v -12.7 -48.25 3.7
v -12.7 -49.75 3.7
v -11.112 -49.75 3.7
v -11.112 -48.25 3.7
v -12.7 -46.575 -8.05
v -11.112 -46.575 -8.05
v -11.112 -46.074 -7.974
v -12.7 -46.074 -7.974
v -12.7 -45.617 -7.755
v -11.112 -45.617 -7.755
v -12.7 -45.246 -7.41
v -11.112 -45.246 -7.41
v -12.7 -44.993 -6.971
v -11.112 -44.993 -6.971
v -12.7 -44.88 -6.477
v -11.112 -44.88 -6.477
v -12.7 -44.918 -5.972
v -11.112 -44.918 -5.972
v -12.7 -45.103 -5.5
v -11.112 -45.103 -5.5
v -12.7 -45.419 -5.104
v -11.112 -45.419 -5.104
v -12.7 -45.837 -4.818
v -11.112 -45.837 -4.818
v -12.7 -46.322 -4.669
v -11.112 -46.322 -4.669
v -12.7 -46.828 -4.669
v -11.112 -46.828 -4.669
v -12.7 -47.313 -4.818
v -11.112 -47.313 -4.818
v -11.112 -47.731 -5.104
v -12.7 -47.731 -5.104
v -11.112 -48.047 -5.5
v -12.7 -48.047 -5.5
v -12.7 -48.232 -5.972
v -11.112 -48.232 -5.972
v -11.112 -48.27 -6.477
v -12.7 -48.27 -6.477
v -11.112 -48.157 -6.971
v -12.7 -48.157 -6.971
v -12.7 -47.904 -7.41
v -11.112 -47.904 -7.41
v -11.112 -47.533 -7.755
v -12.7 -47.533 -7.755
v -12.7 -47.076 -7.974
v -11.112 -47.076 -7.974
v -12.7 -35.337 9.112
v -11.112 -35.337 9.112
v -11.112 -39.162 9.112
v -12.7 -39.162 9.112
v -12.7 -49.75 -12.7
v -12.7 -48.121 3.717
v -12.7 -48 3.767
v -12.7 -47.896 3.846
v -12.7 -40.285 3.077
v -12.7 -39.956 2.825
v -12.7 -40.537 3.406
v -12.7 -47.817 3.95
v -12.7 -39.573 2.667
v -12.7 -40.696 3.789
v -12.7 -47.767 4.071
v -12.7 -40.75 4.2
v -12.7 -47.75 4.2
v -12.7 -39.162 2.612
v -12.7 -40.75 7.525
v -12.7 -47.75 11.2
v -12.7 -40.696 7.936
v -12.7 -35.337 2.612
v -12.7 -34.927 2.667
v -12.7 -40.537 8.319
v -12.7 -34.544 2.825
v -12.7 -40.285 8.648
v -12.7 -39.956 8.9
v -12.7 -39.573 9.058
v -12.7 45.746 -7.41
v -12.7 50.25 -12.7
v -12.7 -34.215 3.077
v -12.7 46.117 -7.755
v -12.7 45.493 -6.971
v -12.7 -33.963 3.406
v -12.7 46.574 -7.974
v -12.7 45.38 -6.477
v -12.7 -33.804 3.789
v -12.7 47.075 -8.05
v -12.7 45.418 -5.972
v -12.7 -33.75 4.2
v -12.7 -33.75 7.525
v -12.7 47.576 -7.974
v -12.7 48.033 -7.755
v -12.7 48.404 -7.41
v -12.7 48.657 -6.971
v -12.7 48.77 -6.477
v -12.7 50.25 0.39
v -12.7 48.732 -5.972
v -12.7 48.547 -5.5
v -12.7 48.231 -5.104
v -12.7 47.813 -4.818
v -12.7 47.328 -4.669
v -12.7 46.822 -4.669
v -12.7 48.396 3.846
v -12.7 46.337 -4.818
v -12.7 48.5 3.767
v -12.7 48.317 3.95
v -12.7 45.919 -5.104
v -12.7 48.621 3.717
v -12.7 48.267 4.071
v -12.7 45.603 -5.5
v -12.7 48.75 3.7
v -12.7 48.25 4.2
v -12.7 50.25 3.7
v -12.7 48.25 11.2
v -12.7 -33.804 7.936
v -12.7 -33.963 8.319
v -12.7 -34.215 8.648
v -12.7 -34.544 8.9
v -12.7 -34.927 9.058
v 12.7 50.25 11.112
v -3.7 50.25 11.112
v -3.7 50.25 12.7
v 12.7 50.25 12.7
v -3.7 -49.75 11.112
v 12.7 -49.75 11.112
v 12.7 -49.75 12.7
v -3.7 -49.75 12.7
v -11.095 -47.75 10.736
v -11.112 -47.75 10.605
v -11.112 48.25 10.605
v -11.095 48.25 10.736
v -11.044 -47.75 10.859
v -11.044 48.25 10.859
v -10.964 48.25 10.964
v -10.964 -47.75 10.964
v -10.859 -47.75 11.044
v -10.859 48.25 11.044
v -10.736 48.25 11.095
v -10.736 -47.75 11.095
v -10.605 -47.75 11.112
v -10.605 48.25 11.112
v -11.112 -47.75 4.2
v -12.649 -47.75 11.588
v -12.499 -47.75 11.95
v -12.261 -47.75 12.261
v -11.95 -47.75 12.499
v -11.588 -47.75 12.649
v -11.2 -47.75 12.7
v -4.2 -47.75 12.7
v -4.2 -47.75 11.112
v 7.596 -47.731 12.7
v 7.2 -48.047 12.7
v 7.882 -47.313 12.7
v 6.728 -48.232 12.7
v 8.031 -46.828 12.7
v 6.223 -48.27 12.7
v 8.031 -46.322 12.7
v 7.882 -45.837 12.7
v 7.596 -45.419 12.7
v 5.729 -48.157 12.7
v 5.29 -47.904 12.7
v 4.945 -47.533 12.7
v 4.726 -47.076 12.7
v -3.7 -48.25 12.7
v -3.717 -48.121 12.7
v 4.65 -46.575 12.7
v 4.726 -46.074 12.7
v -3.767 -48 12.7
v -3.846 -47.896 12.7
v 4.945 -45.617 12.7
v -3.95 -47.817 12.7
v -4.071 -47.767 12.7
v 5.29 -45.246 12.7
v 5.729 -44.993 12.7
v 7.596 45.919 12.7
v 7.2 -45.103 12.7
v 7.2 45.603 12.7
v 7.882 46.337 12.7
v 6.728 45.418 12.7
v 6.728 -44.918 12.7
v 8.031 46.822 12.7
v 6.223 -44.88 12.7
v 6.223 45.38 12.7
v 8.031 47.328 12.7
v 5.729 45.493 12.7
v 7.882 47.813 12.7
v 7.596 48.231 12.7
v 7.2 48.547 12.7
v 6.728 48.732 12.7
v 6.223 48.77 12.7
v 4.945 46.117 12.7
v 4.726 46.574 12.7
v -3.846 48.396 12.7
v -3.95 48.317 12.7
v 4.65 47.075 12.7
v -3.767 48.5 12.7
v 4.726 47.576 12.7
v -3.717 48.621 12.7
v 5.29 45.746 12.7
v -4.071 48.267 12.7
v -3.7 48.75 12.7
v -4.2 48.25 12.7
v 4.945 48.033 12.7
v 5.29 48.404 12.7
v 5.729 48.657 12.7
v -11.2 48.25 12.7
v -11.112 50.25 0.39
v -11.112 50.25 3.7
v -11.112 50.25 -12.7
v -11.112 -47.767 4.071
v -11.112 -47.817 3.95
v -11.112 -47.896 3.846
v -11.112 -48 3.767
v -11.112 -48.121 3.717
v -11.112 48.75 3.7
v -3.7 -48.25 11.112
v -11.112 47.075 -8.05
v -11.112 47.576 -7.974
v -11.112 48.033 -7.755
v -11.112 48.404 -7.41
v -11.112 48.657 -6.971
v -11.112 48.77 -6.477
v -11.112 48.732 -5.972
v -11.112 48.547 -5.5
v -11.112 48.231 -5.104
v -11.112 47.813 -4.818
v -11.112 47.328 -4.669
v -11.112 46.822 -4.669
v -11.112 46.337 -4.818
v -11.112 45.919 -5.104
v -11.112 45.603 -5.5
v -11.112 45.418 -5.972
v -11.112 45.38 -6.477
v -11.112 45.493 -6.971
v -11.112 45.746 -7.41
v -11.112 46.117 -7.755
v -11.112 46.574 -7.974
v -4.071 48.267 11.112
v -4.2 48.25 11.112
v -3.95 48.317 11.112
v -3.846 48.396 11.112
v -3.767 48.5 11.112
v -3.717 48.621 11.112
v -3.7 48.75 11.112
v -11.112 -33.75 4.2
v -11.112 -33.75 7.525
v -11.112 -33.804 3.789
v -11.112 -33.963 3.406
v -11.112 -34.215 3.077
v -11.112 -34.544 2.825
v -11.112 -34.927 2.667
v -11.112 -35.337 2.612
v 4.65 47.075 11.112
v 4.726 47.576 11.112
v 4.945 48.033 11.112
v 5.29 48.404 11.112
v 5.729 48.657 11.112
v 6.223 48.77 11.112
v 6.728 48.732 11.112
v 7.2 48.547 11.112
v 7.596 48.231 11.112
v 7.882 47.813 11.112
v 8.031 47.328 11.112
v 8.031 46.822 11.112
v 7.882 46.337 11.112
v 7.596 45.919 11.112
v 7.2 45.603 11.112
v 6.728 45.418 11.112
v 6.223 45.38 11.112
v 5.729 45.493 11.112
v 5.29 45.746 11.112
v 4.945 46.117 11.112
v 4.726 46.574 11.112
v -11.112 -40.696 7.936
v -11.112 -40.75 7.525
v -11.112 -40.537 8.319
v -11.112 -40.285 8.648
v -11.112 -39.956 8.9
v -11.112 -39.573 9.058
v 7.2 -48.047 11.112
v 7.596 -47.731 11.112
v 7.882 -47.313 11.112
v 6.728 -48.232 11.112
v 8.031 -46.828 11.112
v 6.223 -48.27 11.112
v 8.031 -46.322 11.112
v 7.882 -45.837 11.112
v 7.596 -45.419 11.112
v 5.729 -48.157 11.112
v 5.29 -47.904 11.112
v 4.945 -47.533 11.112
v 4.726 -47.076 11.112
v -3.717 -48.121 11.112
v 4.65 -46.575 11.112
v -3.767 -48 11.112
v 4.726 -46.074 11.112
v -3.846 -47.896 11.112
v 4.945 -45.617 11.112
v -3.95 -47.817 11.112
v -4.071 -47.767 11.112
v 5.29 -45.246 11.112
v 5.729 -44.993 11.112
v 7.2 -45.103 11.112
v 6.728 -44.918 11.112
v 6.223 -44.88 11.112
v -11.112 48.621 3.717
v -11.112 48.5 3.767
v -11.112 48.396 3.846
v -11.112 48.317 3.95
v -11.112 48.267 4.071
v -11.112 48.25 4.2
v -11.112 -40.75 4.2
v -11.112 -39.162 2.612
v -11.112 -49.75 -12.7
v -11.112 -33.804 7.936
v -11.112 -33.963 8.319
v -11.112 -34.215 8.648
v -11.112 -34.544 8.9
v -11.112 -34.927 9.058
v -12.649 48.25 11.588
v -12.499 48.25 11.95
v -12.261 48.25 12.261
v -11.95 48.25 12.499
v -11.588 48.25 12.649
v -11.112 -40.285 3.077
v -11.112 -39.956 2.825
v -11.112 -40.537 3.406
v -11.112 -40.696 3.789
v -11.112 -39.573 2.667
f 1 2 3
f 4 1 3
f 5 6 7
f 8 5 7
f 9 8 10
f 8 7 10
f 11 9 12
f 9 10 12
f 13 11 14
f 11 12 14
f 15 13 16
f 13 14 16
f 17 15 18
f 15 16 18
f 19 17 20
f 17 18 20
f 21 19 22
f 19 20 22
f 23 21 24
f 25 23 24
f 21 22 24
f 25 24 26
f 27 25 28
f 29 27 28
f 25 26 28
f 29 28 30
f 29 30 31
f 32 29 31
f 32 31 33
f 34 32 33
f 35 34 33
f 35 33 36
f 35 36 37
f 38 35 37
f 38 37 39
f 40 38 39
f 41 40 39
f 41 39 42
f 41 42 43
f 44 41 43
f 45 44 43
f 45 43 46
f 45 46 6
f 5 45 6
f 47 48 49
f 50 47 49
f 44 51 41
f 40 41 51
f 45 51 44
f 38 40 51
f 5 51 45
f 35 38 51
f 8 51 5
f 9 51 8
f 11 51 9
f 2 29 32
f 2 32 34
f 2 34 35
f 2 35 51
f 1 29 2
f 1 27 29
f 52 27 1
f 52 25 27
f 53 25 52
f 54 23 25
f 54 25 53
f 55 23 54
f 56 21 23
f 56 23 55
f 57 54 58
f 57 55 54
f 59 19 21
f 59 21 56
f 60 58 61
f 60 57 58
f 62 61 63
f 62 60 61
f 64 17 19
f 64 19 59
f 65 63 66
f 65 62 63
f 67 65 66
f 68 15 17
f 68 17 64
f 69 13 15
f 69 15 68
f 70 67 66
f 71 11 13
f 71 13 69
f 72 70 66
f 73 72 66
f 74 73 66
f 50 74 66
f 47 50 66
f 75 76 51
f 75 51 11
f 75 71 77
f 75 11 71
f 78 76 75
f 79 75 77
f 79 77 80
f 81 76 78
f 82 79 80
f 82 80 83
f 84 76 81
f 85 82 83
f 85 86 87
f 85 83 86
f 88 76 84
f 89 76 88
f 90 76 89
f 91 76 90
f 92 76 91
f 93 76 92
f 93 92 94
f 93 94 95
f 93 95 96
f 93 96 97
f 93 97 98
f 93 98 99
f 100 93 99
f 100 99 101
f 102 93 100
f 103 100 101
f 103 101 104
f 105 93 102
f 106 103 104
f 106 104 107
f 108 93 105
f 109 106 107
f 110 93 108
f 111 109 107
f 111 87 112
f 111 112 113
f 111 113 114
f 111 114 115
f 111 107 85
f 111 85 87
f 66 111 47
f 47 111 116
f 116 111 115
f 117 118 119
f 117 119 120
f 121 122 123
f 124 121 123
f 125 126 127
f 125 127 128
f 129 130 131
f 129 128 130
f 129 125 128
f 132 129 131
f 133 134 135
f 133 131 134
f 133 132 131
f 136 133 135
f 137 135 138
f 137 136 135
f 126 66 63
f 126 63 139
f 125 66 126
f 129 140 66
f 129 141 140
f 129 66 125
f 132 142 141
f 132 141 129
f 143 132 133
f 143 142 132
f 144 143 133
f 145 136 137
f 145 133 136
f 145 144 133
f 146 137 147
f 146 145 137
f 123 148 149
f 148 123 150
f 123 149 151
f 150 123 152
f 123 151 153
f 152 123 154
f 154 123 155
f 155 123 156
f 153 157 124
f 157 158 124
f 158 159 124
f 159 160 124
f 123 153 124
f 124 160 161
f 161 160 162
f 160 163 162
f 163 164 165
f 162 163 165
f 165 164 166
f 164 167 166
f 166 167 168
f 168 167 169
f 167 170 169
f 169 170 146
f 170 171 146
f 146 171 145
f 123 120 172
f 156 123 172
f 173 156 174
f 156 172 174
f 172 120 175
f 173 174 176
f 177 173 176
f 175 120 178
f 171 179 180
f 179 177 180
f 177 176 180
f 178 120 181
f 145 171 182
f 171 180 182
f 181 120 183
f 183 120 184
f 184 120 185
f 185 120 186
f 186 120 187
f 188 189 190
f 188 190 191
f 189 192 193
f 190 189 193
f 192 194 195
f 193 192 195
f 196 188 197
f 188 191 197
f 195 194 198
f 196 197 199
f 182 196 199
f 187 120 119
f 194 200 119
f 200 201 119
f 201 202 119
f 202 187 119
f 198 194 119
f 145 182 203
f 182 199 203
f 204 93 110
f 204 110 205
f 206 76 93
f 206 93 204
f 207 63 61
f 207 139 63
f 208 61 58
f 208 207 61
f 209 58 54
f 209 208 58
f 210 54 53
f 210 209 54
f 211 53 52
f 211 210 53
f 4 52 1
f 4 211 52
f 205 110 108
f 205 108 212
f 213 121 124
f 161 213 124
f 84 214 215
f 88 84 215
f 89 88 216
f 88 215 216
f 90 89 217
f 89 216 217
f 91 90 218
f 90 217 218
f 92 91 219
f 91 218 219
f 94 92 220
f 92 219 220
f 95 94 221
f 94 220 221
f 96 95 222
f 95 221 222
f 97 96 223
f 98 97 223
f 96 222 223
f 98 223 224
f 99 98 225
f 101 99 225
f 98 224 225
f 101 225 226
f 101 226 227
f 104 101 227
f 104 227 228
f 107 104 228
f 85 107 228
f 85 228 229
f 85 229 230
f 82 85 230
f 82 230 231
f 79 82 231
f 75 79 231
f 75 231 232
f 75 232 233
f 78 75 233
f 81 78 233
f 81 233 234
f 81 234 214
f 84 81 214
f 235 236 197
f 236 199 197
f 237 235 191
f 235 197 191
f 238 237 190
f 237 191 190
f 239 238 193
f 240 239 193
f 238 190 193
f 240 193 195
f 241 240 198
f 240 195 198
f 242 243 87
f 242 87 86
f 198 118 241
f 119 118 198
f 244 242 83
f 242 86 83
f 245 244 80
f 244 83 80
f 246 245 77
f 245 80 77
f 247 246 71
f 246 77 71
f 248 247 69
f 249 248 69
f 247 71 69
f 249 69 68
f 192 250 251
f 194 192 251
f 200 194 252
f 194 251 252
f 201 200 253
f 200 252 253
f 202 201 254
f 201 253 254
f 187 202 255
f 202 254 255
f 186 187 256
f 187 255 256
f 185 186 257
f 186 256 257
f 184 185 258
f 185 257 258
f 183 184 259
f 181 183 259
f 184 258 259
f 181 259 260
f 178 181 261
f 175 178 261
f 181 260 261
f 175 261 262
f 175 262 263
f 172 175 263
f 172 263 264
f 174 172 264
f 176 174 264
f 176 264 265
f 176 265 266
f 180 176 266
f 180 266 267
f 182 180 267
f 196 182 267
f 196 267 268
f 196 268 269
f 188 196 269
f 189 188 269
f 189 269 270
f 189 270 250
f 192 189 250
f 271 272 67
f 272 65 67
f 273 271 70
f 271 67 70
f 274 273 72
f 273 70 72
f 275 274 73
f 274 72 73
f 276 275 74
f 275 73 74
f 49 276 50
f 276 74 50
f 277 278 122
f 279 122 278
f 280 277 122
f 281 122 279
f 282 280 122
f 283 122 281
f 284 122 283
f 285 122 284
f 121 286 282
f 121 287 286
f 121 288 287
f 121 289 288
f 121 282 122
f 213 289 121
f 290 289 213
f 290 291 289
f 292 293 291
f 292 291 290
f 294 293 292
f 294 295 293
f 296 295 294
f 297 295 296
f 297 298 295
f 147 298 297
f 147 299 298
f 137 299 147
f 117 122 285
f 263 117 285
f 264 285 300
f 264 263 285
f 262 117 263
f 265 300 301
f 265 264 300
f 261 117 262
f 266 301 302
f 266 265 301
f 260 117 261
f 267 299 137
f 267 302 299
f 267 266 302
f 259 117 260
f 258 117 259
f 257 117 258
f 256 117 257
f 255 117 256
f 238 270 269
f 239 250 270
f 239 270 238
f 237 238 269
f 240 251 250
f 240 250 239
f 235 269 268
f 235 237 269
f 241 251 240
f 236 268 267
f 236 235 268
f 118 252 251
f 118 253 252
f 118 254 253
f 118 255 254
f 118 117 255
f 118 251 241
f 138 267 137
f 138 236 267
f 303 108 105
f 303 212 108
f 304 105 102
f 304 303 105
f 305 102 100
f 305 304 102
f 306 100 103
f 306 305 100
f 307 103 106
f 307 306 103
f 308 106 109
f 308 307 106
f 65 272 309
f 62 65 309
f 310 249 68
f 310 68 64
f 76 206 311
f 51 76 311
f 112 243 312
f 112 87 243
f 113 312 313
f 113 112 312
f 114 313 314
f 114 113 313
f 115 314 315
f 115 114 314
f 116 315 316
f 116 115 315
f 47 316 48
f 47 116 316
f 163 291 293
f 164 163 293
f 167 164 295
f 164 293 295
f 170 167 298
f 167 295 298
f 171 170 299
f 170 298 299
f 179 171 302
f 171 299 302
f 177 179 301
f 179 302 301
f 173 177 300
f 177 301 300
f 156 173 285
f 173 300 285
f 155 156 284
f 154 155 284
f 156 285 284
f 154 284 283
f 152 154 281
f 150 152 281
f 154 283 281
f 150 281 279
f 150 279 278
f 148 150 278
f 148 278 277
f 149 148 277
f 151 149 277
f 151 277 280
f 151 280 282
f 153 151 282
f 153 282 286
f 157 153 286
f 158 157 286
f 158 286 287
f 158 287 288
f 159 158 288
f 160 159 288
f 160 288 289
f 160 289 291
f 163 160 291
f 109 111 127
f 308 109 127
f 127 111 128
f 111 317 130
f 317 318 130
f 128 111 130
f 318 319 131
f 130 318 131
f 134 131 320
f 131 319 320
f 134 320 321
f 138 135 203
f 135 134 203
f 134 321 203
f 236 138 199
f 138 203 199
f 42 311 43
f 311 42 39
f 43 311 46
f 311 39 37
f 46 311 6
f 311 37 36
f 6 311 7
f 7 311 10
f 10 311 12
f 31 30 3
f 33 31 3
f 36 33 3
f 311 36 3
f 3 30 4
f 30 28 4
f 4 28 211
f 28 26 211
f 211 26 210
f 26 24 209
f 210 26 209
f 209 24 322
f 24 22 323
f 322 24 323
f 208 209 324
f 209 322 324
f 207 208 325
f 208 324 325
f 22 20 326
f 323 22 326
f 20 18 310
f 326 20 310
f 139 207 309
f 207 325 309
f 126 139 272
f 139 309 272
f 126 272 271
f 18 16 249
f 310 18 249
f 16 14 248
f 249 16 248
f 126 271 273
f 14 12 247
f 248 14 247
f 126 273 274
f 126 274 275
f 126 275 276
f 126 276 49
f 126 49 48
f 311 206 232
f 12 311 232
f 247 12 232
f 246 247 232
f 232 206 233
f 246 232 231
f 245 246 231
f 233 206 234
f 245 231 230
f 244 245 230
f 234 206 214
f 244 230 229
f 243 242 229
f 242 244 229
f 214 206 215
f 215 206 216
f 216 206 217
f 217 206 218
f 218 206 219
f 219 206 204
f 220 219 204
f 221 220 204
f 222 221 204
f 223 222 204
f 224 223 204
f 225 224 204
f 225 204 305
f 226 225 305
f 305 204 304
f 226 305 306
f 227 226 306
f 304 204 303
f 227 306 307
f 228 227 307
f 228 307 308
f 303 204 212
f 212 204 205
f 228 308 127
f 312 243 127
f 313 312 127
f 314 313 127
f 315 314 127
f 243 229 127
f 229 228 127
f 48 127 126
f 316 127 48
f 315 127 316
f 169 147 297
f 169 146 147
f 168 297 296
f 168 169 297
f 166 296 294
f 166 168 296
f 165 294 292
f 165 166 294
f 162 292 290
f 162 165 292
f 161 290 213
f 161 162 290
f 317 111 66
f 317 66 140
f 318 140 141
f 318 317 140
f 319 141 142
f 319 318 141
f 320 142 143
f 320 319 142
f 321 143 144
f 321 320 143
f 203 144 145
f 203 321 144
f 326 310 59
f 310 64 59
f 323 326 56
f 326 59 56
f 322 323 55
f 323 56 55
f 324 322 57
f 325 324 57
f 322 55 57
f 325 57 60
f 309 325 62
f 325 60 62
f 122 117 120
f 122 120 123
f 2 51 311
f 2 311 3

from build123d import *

# Parameters (mm, degrees)
SKETCH1_W             = 25.4
SKETCH1_H             = 25.4
BOSS_EXTRUDE1_DEPTH   = 56.75
SKETCH2_W             = 23.8125
SKETCH2_H             = 23.8125
CUT_EXTRUDE1_DEPTH    = 115.912270885
FILLET1_R             = 0.508
M3_CLEARANCE_HOLE1_D  = 3.4
M3_CLEARANCE_HOLE2_D  = 3.4
M3_CLEARANCE_HOLE3_D  = 3.4
M3_CLEARANCE_HOLE4_D  = 3.4
FILLET2_R             = 1.5
CUT_EXTRUDE2_REACH    = 65.459
SKETCH11_W            = 16.9
SKETCH11_H            = 6.499999954
SKETCH11_H_2          = 7
CUT_EXTRUDE3_REACH    = 65.459
SKETCH12_W            = 16.9
SKETCH12_H            = 6.5
SKETCH12_H_2          = 7
FILLET3_R             = 3.81
CUT_EXTRUDE4_REACH    = 65.459
SKETCH13_W            = 15.4
SKETCH13_H            = 87.3
CUT_EXTRUDE5_REACH    = 65.459
SKETCH14_W            = 15.4
SKETCH14_H            = 87.3
CHAMFER2_SIZE         = 6.35
FILLET5_R             = 3.81
SKETCH15_W            = 12.31
SKETCH15_H            = 12.31
CUT_EXTRUDE6_DEPTH    = 6.5
SKETCH17_W            = 12.31
SKETCH17_H            = 12.31
CUT_EXTRUDE8_DEPTH    = 7
BOSS_EXTRUDE2_START   = -1.5875
BOSS_EXTRUDE2_DEPTH   = 1.5875
BOSS_EXTRUDE3_START   = -1.5875
BOSS_EXTRUDE3_DEPTH   = 1.5875
CUT_EXTRUDE12_REACH   = 59.038
SKETCH23_W            = 6.5
SKETCH23_H            = 7
FILLET9_R             = 1.5875
FILLET9_OF_MIRROR3_R  = 1.5875
BOSS_EXTRUDE4_DEPTH   = 1.5875
SKETCH25_W            = 9
SKETCH25_H            = 9
CUT_EXTRUDE13_DEPTH   = 2
FILLET10_R            = 0.5
FILLET10_OF_MIRROR4_R = 0.5


with BuildPart() as part:
    # Sketch1 → Boss-Extrude1 (new, symmetric)
    with BuildSketch(Plane(origin=(0, 0, 0), x_dir=(1, 0, 0), z_dir=(0, 1, 0))):
        Rectangle(SKETCH1_W, SKETCH1_H)
    extrude(amount=BOSS_EXTRUDE1_DEPTH, both=True)

    # Sketch2 → Cut-Extrude1 (cut, through all)
    with BuildSketch(Plane(origin=(0, 56.75, 0), x_dir=(1, 0, 0), z_dir=(0, 1, 0))):
        with Locations((0.79375, 0.79375)):
            Rectangle(SKETCH2_W, SKETCH2_H)
    extrude(amount=-CUT_EXTRUDE1_DEPTH, mode=Mode.SUBTRACT)

    # Fillet1
    fillet1_edges = [part.edges().sort_by_distance(p)[0] for p in [
        (-11.1125, 0, 11.1125),
    ]]
    fillet(fillet1_edges, radius=FILLET1_R)

    # M3 Clearance Hole1 (through all)
    with Locations(Plane.XY.offset(12.7)):
        with Locations((6.35, 47.075)):
            Hole(M3_CLEARANCE_HOLE1_D / 2)

    # M3 Clearance Hole2 (through all)
    with Locations(Plane.ZY.offset(12.7)):
        with Locations((-6.35, 47.075)):
            Hole(M3_CLEARANCE_HOLE2_D / 2)

    # M3 Clearance Hole3 (through all)
    with Locations(Plane.XY.offset(12.7)):
        with Locations((6.35, -46.575)):
            Hole(M3_CLEARANCE_HOLE3_D / 2)

    # M3 Clearance Hole4 (through all)
    with Locations(Plane.ZY.offset(12.7)):
        with Locations((-6.35, -46.575)):
            Hole(M3_CLEARANCE_HOLE4_D / 2)

    # Fillet2
    fillet2_edges = [part.edges().sort_by_distance(p)[0] for p in [
        (-12.7, 0, 12.7),
    ]]
    fillet(fillet2_edges, radius=FILLET2_R)

    # Sketch11 → Cut-Extrude2 (cut, up to next)
    with BuildSketch(Plane.ZY.offset(12.7), mode=Mode.PRIVATE) as cut_extrude2_sk1:
        with Locations((-4.25, 53.500000023)):
            Rectangle(SKETCH11_W, SKETCH11_H)
    cut_extrude2_tool1 = extrude(cut_extrude2_sk1.sketch, amount=-CUT_EXTRUDE2_REACH, mode=Mode.PRIVATE) & part.part
    # Sketch11 → Cut-Extrude2 (cut, up to next)
    with BuildSketch(Plane.ZY.offset(12.7), mode=Mode.PRIVATE) as cut_extrude2_sk2:
        with Locations((-4.25, -53.25)):
            Rectangle(SKETCH11_W, SKETCH11_H_2)
    cut_extrude2_tool2 = extrude(cut_extrude2_sk2.sketch, amount=-CUT_EXTRUDE2_REACH, mode=Mode.PRIVATE) & part.part
    add(cut_extrude2_tool1.solids().sort_by_distance((-12.7, 53.5, -4.25))[0], mode=Mode.SUBTRACT)
    add(cut_extrude2_tool2.solids().sort_by_distance((-12.7, -53.25, -4.25))[0], mode=Mode.SUBTRACT)

    # Sketch12 → Cut-Extrude3 (cut, up to next)
    with BuildSketch(Plane.XY.offset(12.7), mode=Mode.PRIVATE) as cut_extrude3_sk1:
        with Locations((4.25, 53.5)):
            Rectangle(SKETCH12_W, SKETCH12_H)
    cut_extrude3_tool1 = extrude(cut_extrude3_sk1.sketch, amount=-CUT_EXTRUDE3_REACH, mode=Mode.PRIVATE) & part.part
    # Sketch12 → Cut-Extrude3 (cut, up to next)
    with BuildSketch(Plane.XY.offset(12.7), mode=Mode.PRIVATE) as cut_extrude3_sk2:
        with Locations((4.25, -53.25)):
            Rectangle(SKETCH12_W, SKETCH12_H_2)
    cut_extrude3_tool2 = extrude(cut_extrude3_sk2.sketch, amount=-CUT_EXTRUDE3_REACH, mode=Mode.PRIVATE) & part.part
    add(cut_extrude3_tool1.solids().sort_by_distance((4.25, 53.5, 12.7))[0], mode=Mode.SUBTRACT)
    add(cut_extrude3_tool2.solids().sort_by_distance((4.25, -53.25, 12.7))[0], mode=Mode.SUBTRACT)

    # Fillet3
    fillet3_edges = [part.edges().sort_by_distance(p)[0] for p in [
        (-4.2, 50.25, 11.90625),
        (-4.2, -49.75, 11.90625),
        (-11.90625, 50.250000046, 4.2),
        (-11.90625, -49.75, 4.2),
    ]]
    fillet(fillet3_edges, radius=FILLET3_R)

    # Sketch13 → Cut-Extrude4 (cut, up to next)
    with BuildSketch(Plane.ZY.offset(12.7), mode=Mode.PRIVATE) as cut_extrude4_sk1:
        with Locations((-5, 0.25)):
            Rectangle(SKETCH13_W, SKETCH13_H)
    cut_extrude4_tool1 = extrude(cut_extrude4_sk1.sketch, amount=-CUT_EXTRUDE4_REACH, mode=Mode.PRIVATE) & part.part
    add(cut_extrude4_tool1.solids().sort_by_distance((-12.7, 0.25, -5))[0], mode=Mode.SUBTRACT)

    # Sketch14 → Cut-Extrude5 (cut, up to next)
    with BuildSketch(Plane.XY.offset(12.7), mode=Mode.PRIVATE) as cut_extrude5_sk1:
        with Locations((5, 0.25)):
            Rectangle(SKETCH14_W, SKETCH14_H)
    cut_extrude5_tool1 = extrude(cut_extrude5_sk1.sketch, amount=-CUT_EXTRUDE5_REACH, mode=Mode.PRIVATE) & part.part
    add(cut_extrude5_tool1.solids().sort_by_distance((5, 0.25, 12.7))[0], mode=Mode.SUBTRACT)

    # Chamfer2
    chamfer2_edges = [part.edges().sort_by_distance(p)[0] for p in [
        (-11.90625, 43.9, 2.7),
        (-11.90625, -43.4, 2.7),
        (-2.7, -43.4, 11.90625),
        (-2.7, 43.9, 11.90625),
    ]]
    chamfer(chamfer2_edges, length=CHAMFER2_SIZE)

    # Fillet5
    fillet5_edges = [part.edges().sort_by_distance(p)[0] for p in [
        (-11.90625, 43.9, -3.65),
        (-11.90625, -37.05, 2.7),
        (-11.90625, 37.55, 2.7),
        (-2.7, -37.05, 11.90625),
        (-2.7, 37.55, 11.90625),
        (3.65, 43.9, 11.90625),
        (3.65, -43.4, 11.90625),
        (-11.90625, -43.4, -3.65),
    ]]
    fillet(fillet5_edges, radius=FILLET5_R)

    # Sketch15 → Cut-Extrude6 (cut)
    with BuildSketch(Plane(origin=(0, 56.75, 0), x_dir=(1, 0, 0), z_dir=(0, 1, 0))):
        with Locations((-6.545, -6.545)):
            Rectangle(SKETCH15_W, SKETCH15_H)
    extrude(amount=-CUT_EXTRUDE6_DEPTH, mode=Mode.SUBTRACT)

    # Sketch17 → Cut-Extrude8 (cut)
    with BuildSketch(Plane.XZ.offset(56.75)):
        with Locations((-6.545, 6.545)):
            Rectangle(SKETCH17_W, SKETCH17_H)
    extrude(amount=-CUT_EXTRUDE8_DEPTH, mode=Mode.SUBTRACT)

    # Sketch20 → Boss-Extrude2 (add)
    with BuildSketch(Plane.ZY.offset(12.7).offset(BOSS_EXTRUDE2_START)):
        with BuildLine():
            Line((-12.7, 43.9), (-12.7, -43.4))
            Line((-12.7, -43.4), (-5.228153673, -43.4))
            ThreePointArc((-5.228153673, -43.4), (-3.770129795, -43.109981019), (-2.534076836, -42.284076836))
            Line((-2.534076836, -42.284076836), (1.584076836, -38.165923164))
            ThreePointArc((1.584076836, -38.165923164), (2.409981019, -36.929870205), (2.7, -35.471846327))
            Line((2.7, -35.471846327), (2.7, 35.971846327))
            ThreePointArc((2.7, 35.971846327), (2.409981019, 37.429870205), (1.584076836, 38.665923164))
            Line((1.584076836, 38.665923164), (-2.534076836, 42.784076836))
            ThreePointArc((-2.534076836, 42.784076836), (-3.770129795, 43.609981019), (-5.228153673, 43.9))
            Line((-5.228153673, 43.9), (-12.7, 43.9))
        make_face()
    extrude(amount=BOSS_EXTRUDE2_DEPTH)

    # Sketch21 → Boss-Extrude3 (add)
    with BuildSketch(Plane.XY.offset(12.7).offset(BOSS_EXTRUDE3_START)):
        with BuildLine():
            Line((12.7, 43.9), (12.7, -43.4))
            Line((12.7, -43.4), (5.228153673, -43.4))
            ThreePointArc((5.228153673, -43.4), (3.770129795, -43.109981019), (2.534076836, -42.284076836))
            Line((2.534076836, -42.284076836), (-1.584076836, -38.165923164))
            ThreePointArc((-1.584076836, -38.165923164), (-2.409981019, -36.929870205), (-2.7, -35.471846327))
            Line((-2.7, -35.471846327), (-2.7, 35.971846327))
            ThreePointArc((-2.7, 35.971846327), (-2.409981019, 37.429870205), (-1.584076836, 38.665923164))
            Line((-1.584076836, 38.665923164), (2.534076836, 42.784076836))
            ThreePointArc((2.534076836, 42.784076836), (3.770129795, 43.609981019), (5.228153673, 43.9))
            Line((5.228153673, 43.9), (12.7, 43.9))
        make_face()
    extrude(amount=BOSS_EXTRUDE3_DEPTH)

    # Sketch23 → Cut-Extrude12 (cut, up to next)
    with BuildSketch(Plane(origin=(-11.1125, 0, 0), x_dir=(0, 0, -1), z_dir=(1, 0, 0)), mode=Mode.PRIVATE) as cut_extrude12_sk1:
        with Locations((-5.8625, 37.75)):
            Rectangle(SKETCH23_W, SKETCH23_H)
    cut_extrude12_tool1 = extrude(cut_extrude12_sk1.sketch, amount=-CUT_EXTRUDE12_REACH, mode=Mode.PRIVATE) & part.part
    cut_extrude12 = cut_extrude12_tool1.solids().sort_by_distance((-11.1125, 37.75, 5.8625))[0]
    add(cut_extrude12, mode=Mode.SUBTRACT)

    # Fillet9
    fillet9_edges = [part.edges().sort_by_distance(p)[0] for p in [
        (-11.90625, 41.25, 9.1125),
        (-11.90625, 41.25, 2.6125),
        (-11.90625, 34.25, 2.6125),
        (-11.90625, 34.25, 9.1125),
    ]]
    fillet(fillet9_edges, radius=FILLET9_R)

    # Mirror3: Cut-Extrude12 across plane
    add(cut_extrude12.mirror(Plane.ZX.offset(0.250000023)), mode=Mode.SUBTRACT)

    # Fillet9 of Mirror3
    fillet9_of_mirror3_edges = [part.edges().sort_by_distance(p)[0] for p in [
        (-11.90625, -40.749999954, 9.1125),
        (-11.90625, -40.749999954, 2.6125),
        (-11.90625, -33.749999954, 2.6125),
        (-11.90625, -33.749999954, 9.1125),
    ]]
    fillet(fillet9_of_mirror3_edges, radius=FILLET9_OF_MIRROR3_R)

    # Sketch24 → Boss-Extrude4 (add)
    with BuildSketch(Plane.ZY.offset(12.7)):
        with BuildLine():
            Line((4.2, 34.25), (7.525, 34.25))
            ThreePointArc((7.525, 34.25), (8.647532015, 34.714967985), (9.1125, 35.8375))
            Line((9.1125, 35.8375), (9.1125, 39.6625))
            ThreePointArc((9.1125, 39.6625), (8.647532015, 40.785032015), (7.525, 41.25))
            Line((7.525, 41.25), (4.2, 41.25))
            ThreePointArc((4.2, 41.25), (3.077467985, 40.785032015), (2.6125, 39.6625))
            Line((2.6125, 39.6625), (2.6125, 35.8375))
            ThreePointArc((2.6125, 35.8375), (3.077467985, 34.714967985), (4.2, 34.25))
        make_face()
    extrude(amount=-BOSS_EXTRUDE4_DEPTH)

    # Sketch25 → Cut-Extrude13 (cut)
    with BuildSketch(Plane.XZ.offset(49.75)):
        with Locations((-8.2, 8.2)):
            Rectangle(SKETCH25_W, SKETCH25_H)
    cut_extrude13 = extrude(amount=-CUT_EXTRUDE13_DEPTH, mode=Mode.SUBTRACT)

    # Fillet10
    fillet10_edges = [part.edges().sort_by_distance(p)[0] for p in [
        (-3.7, -47.75, 11.90625),
        (-11.90625, -47.75, 3.7),
    ]]
    fillet(fillet10_edges, radius=FILLET10_R)

    # Mirror4: Cut-Extrude13 across plane
    add(cut_extrude13.mirror(Plane.ZX.offset(0.250000023)), mode=Mode.SUBTRACT)

    # Fillet10 of Mirror4
    fillet10_of_mirror4_edges = [part.edges().sort_by_distance(p)[0] for p in [
        (-3.7, 48.250000046, 11.90625),
        (-11.90625, 48.250000046, 3.7),
    ]]
    fillet(fillet10_of_mirror4_edges, radius=FILLET10_OF_MIRROR4_R)


solid = part.part
